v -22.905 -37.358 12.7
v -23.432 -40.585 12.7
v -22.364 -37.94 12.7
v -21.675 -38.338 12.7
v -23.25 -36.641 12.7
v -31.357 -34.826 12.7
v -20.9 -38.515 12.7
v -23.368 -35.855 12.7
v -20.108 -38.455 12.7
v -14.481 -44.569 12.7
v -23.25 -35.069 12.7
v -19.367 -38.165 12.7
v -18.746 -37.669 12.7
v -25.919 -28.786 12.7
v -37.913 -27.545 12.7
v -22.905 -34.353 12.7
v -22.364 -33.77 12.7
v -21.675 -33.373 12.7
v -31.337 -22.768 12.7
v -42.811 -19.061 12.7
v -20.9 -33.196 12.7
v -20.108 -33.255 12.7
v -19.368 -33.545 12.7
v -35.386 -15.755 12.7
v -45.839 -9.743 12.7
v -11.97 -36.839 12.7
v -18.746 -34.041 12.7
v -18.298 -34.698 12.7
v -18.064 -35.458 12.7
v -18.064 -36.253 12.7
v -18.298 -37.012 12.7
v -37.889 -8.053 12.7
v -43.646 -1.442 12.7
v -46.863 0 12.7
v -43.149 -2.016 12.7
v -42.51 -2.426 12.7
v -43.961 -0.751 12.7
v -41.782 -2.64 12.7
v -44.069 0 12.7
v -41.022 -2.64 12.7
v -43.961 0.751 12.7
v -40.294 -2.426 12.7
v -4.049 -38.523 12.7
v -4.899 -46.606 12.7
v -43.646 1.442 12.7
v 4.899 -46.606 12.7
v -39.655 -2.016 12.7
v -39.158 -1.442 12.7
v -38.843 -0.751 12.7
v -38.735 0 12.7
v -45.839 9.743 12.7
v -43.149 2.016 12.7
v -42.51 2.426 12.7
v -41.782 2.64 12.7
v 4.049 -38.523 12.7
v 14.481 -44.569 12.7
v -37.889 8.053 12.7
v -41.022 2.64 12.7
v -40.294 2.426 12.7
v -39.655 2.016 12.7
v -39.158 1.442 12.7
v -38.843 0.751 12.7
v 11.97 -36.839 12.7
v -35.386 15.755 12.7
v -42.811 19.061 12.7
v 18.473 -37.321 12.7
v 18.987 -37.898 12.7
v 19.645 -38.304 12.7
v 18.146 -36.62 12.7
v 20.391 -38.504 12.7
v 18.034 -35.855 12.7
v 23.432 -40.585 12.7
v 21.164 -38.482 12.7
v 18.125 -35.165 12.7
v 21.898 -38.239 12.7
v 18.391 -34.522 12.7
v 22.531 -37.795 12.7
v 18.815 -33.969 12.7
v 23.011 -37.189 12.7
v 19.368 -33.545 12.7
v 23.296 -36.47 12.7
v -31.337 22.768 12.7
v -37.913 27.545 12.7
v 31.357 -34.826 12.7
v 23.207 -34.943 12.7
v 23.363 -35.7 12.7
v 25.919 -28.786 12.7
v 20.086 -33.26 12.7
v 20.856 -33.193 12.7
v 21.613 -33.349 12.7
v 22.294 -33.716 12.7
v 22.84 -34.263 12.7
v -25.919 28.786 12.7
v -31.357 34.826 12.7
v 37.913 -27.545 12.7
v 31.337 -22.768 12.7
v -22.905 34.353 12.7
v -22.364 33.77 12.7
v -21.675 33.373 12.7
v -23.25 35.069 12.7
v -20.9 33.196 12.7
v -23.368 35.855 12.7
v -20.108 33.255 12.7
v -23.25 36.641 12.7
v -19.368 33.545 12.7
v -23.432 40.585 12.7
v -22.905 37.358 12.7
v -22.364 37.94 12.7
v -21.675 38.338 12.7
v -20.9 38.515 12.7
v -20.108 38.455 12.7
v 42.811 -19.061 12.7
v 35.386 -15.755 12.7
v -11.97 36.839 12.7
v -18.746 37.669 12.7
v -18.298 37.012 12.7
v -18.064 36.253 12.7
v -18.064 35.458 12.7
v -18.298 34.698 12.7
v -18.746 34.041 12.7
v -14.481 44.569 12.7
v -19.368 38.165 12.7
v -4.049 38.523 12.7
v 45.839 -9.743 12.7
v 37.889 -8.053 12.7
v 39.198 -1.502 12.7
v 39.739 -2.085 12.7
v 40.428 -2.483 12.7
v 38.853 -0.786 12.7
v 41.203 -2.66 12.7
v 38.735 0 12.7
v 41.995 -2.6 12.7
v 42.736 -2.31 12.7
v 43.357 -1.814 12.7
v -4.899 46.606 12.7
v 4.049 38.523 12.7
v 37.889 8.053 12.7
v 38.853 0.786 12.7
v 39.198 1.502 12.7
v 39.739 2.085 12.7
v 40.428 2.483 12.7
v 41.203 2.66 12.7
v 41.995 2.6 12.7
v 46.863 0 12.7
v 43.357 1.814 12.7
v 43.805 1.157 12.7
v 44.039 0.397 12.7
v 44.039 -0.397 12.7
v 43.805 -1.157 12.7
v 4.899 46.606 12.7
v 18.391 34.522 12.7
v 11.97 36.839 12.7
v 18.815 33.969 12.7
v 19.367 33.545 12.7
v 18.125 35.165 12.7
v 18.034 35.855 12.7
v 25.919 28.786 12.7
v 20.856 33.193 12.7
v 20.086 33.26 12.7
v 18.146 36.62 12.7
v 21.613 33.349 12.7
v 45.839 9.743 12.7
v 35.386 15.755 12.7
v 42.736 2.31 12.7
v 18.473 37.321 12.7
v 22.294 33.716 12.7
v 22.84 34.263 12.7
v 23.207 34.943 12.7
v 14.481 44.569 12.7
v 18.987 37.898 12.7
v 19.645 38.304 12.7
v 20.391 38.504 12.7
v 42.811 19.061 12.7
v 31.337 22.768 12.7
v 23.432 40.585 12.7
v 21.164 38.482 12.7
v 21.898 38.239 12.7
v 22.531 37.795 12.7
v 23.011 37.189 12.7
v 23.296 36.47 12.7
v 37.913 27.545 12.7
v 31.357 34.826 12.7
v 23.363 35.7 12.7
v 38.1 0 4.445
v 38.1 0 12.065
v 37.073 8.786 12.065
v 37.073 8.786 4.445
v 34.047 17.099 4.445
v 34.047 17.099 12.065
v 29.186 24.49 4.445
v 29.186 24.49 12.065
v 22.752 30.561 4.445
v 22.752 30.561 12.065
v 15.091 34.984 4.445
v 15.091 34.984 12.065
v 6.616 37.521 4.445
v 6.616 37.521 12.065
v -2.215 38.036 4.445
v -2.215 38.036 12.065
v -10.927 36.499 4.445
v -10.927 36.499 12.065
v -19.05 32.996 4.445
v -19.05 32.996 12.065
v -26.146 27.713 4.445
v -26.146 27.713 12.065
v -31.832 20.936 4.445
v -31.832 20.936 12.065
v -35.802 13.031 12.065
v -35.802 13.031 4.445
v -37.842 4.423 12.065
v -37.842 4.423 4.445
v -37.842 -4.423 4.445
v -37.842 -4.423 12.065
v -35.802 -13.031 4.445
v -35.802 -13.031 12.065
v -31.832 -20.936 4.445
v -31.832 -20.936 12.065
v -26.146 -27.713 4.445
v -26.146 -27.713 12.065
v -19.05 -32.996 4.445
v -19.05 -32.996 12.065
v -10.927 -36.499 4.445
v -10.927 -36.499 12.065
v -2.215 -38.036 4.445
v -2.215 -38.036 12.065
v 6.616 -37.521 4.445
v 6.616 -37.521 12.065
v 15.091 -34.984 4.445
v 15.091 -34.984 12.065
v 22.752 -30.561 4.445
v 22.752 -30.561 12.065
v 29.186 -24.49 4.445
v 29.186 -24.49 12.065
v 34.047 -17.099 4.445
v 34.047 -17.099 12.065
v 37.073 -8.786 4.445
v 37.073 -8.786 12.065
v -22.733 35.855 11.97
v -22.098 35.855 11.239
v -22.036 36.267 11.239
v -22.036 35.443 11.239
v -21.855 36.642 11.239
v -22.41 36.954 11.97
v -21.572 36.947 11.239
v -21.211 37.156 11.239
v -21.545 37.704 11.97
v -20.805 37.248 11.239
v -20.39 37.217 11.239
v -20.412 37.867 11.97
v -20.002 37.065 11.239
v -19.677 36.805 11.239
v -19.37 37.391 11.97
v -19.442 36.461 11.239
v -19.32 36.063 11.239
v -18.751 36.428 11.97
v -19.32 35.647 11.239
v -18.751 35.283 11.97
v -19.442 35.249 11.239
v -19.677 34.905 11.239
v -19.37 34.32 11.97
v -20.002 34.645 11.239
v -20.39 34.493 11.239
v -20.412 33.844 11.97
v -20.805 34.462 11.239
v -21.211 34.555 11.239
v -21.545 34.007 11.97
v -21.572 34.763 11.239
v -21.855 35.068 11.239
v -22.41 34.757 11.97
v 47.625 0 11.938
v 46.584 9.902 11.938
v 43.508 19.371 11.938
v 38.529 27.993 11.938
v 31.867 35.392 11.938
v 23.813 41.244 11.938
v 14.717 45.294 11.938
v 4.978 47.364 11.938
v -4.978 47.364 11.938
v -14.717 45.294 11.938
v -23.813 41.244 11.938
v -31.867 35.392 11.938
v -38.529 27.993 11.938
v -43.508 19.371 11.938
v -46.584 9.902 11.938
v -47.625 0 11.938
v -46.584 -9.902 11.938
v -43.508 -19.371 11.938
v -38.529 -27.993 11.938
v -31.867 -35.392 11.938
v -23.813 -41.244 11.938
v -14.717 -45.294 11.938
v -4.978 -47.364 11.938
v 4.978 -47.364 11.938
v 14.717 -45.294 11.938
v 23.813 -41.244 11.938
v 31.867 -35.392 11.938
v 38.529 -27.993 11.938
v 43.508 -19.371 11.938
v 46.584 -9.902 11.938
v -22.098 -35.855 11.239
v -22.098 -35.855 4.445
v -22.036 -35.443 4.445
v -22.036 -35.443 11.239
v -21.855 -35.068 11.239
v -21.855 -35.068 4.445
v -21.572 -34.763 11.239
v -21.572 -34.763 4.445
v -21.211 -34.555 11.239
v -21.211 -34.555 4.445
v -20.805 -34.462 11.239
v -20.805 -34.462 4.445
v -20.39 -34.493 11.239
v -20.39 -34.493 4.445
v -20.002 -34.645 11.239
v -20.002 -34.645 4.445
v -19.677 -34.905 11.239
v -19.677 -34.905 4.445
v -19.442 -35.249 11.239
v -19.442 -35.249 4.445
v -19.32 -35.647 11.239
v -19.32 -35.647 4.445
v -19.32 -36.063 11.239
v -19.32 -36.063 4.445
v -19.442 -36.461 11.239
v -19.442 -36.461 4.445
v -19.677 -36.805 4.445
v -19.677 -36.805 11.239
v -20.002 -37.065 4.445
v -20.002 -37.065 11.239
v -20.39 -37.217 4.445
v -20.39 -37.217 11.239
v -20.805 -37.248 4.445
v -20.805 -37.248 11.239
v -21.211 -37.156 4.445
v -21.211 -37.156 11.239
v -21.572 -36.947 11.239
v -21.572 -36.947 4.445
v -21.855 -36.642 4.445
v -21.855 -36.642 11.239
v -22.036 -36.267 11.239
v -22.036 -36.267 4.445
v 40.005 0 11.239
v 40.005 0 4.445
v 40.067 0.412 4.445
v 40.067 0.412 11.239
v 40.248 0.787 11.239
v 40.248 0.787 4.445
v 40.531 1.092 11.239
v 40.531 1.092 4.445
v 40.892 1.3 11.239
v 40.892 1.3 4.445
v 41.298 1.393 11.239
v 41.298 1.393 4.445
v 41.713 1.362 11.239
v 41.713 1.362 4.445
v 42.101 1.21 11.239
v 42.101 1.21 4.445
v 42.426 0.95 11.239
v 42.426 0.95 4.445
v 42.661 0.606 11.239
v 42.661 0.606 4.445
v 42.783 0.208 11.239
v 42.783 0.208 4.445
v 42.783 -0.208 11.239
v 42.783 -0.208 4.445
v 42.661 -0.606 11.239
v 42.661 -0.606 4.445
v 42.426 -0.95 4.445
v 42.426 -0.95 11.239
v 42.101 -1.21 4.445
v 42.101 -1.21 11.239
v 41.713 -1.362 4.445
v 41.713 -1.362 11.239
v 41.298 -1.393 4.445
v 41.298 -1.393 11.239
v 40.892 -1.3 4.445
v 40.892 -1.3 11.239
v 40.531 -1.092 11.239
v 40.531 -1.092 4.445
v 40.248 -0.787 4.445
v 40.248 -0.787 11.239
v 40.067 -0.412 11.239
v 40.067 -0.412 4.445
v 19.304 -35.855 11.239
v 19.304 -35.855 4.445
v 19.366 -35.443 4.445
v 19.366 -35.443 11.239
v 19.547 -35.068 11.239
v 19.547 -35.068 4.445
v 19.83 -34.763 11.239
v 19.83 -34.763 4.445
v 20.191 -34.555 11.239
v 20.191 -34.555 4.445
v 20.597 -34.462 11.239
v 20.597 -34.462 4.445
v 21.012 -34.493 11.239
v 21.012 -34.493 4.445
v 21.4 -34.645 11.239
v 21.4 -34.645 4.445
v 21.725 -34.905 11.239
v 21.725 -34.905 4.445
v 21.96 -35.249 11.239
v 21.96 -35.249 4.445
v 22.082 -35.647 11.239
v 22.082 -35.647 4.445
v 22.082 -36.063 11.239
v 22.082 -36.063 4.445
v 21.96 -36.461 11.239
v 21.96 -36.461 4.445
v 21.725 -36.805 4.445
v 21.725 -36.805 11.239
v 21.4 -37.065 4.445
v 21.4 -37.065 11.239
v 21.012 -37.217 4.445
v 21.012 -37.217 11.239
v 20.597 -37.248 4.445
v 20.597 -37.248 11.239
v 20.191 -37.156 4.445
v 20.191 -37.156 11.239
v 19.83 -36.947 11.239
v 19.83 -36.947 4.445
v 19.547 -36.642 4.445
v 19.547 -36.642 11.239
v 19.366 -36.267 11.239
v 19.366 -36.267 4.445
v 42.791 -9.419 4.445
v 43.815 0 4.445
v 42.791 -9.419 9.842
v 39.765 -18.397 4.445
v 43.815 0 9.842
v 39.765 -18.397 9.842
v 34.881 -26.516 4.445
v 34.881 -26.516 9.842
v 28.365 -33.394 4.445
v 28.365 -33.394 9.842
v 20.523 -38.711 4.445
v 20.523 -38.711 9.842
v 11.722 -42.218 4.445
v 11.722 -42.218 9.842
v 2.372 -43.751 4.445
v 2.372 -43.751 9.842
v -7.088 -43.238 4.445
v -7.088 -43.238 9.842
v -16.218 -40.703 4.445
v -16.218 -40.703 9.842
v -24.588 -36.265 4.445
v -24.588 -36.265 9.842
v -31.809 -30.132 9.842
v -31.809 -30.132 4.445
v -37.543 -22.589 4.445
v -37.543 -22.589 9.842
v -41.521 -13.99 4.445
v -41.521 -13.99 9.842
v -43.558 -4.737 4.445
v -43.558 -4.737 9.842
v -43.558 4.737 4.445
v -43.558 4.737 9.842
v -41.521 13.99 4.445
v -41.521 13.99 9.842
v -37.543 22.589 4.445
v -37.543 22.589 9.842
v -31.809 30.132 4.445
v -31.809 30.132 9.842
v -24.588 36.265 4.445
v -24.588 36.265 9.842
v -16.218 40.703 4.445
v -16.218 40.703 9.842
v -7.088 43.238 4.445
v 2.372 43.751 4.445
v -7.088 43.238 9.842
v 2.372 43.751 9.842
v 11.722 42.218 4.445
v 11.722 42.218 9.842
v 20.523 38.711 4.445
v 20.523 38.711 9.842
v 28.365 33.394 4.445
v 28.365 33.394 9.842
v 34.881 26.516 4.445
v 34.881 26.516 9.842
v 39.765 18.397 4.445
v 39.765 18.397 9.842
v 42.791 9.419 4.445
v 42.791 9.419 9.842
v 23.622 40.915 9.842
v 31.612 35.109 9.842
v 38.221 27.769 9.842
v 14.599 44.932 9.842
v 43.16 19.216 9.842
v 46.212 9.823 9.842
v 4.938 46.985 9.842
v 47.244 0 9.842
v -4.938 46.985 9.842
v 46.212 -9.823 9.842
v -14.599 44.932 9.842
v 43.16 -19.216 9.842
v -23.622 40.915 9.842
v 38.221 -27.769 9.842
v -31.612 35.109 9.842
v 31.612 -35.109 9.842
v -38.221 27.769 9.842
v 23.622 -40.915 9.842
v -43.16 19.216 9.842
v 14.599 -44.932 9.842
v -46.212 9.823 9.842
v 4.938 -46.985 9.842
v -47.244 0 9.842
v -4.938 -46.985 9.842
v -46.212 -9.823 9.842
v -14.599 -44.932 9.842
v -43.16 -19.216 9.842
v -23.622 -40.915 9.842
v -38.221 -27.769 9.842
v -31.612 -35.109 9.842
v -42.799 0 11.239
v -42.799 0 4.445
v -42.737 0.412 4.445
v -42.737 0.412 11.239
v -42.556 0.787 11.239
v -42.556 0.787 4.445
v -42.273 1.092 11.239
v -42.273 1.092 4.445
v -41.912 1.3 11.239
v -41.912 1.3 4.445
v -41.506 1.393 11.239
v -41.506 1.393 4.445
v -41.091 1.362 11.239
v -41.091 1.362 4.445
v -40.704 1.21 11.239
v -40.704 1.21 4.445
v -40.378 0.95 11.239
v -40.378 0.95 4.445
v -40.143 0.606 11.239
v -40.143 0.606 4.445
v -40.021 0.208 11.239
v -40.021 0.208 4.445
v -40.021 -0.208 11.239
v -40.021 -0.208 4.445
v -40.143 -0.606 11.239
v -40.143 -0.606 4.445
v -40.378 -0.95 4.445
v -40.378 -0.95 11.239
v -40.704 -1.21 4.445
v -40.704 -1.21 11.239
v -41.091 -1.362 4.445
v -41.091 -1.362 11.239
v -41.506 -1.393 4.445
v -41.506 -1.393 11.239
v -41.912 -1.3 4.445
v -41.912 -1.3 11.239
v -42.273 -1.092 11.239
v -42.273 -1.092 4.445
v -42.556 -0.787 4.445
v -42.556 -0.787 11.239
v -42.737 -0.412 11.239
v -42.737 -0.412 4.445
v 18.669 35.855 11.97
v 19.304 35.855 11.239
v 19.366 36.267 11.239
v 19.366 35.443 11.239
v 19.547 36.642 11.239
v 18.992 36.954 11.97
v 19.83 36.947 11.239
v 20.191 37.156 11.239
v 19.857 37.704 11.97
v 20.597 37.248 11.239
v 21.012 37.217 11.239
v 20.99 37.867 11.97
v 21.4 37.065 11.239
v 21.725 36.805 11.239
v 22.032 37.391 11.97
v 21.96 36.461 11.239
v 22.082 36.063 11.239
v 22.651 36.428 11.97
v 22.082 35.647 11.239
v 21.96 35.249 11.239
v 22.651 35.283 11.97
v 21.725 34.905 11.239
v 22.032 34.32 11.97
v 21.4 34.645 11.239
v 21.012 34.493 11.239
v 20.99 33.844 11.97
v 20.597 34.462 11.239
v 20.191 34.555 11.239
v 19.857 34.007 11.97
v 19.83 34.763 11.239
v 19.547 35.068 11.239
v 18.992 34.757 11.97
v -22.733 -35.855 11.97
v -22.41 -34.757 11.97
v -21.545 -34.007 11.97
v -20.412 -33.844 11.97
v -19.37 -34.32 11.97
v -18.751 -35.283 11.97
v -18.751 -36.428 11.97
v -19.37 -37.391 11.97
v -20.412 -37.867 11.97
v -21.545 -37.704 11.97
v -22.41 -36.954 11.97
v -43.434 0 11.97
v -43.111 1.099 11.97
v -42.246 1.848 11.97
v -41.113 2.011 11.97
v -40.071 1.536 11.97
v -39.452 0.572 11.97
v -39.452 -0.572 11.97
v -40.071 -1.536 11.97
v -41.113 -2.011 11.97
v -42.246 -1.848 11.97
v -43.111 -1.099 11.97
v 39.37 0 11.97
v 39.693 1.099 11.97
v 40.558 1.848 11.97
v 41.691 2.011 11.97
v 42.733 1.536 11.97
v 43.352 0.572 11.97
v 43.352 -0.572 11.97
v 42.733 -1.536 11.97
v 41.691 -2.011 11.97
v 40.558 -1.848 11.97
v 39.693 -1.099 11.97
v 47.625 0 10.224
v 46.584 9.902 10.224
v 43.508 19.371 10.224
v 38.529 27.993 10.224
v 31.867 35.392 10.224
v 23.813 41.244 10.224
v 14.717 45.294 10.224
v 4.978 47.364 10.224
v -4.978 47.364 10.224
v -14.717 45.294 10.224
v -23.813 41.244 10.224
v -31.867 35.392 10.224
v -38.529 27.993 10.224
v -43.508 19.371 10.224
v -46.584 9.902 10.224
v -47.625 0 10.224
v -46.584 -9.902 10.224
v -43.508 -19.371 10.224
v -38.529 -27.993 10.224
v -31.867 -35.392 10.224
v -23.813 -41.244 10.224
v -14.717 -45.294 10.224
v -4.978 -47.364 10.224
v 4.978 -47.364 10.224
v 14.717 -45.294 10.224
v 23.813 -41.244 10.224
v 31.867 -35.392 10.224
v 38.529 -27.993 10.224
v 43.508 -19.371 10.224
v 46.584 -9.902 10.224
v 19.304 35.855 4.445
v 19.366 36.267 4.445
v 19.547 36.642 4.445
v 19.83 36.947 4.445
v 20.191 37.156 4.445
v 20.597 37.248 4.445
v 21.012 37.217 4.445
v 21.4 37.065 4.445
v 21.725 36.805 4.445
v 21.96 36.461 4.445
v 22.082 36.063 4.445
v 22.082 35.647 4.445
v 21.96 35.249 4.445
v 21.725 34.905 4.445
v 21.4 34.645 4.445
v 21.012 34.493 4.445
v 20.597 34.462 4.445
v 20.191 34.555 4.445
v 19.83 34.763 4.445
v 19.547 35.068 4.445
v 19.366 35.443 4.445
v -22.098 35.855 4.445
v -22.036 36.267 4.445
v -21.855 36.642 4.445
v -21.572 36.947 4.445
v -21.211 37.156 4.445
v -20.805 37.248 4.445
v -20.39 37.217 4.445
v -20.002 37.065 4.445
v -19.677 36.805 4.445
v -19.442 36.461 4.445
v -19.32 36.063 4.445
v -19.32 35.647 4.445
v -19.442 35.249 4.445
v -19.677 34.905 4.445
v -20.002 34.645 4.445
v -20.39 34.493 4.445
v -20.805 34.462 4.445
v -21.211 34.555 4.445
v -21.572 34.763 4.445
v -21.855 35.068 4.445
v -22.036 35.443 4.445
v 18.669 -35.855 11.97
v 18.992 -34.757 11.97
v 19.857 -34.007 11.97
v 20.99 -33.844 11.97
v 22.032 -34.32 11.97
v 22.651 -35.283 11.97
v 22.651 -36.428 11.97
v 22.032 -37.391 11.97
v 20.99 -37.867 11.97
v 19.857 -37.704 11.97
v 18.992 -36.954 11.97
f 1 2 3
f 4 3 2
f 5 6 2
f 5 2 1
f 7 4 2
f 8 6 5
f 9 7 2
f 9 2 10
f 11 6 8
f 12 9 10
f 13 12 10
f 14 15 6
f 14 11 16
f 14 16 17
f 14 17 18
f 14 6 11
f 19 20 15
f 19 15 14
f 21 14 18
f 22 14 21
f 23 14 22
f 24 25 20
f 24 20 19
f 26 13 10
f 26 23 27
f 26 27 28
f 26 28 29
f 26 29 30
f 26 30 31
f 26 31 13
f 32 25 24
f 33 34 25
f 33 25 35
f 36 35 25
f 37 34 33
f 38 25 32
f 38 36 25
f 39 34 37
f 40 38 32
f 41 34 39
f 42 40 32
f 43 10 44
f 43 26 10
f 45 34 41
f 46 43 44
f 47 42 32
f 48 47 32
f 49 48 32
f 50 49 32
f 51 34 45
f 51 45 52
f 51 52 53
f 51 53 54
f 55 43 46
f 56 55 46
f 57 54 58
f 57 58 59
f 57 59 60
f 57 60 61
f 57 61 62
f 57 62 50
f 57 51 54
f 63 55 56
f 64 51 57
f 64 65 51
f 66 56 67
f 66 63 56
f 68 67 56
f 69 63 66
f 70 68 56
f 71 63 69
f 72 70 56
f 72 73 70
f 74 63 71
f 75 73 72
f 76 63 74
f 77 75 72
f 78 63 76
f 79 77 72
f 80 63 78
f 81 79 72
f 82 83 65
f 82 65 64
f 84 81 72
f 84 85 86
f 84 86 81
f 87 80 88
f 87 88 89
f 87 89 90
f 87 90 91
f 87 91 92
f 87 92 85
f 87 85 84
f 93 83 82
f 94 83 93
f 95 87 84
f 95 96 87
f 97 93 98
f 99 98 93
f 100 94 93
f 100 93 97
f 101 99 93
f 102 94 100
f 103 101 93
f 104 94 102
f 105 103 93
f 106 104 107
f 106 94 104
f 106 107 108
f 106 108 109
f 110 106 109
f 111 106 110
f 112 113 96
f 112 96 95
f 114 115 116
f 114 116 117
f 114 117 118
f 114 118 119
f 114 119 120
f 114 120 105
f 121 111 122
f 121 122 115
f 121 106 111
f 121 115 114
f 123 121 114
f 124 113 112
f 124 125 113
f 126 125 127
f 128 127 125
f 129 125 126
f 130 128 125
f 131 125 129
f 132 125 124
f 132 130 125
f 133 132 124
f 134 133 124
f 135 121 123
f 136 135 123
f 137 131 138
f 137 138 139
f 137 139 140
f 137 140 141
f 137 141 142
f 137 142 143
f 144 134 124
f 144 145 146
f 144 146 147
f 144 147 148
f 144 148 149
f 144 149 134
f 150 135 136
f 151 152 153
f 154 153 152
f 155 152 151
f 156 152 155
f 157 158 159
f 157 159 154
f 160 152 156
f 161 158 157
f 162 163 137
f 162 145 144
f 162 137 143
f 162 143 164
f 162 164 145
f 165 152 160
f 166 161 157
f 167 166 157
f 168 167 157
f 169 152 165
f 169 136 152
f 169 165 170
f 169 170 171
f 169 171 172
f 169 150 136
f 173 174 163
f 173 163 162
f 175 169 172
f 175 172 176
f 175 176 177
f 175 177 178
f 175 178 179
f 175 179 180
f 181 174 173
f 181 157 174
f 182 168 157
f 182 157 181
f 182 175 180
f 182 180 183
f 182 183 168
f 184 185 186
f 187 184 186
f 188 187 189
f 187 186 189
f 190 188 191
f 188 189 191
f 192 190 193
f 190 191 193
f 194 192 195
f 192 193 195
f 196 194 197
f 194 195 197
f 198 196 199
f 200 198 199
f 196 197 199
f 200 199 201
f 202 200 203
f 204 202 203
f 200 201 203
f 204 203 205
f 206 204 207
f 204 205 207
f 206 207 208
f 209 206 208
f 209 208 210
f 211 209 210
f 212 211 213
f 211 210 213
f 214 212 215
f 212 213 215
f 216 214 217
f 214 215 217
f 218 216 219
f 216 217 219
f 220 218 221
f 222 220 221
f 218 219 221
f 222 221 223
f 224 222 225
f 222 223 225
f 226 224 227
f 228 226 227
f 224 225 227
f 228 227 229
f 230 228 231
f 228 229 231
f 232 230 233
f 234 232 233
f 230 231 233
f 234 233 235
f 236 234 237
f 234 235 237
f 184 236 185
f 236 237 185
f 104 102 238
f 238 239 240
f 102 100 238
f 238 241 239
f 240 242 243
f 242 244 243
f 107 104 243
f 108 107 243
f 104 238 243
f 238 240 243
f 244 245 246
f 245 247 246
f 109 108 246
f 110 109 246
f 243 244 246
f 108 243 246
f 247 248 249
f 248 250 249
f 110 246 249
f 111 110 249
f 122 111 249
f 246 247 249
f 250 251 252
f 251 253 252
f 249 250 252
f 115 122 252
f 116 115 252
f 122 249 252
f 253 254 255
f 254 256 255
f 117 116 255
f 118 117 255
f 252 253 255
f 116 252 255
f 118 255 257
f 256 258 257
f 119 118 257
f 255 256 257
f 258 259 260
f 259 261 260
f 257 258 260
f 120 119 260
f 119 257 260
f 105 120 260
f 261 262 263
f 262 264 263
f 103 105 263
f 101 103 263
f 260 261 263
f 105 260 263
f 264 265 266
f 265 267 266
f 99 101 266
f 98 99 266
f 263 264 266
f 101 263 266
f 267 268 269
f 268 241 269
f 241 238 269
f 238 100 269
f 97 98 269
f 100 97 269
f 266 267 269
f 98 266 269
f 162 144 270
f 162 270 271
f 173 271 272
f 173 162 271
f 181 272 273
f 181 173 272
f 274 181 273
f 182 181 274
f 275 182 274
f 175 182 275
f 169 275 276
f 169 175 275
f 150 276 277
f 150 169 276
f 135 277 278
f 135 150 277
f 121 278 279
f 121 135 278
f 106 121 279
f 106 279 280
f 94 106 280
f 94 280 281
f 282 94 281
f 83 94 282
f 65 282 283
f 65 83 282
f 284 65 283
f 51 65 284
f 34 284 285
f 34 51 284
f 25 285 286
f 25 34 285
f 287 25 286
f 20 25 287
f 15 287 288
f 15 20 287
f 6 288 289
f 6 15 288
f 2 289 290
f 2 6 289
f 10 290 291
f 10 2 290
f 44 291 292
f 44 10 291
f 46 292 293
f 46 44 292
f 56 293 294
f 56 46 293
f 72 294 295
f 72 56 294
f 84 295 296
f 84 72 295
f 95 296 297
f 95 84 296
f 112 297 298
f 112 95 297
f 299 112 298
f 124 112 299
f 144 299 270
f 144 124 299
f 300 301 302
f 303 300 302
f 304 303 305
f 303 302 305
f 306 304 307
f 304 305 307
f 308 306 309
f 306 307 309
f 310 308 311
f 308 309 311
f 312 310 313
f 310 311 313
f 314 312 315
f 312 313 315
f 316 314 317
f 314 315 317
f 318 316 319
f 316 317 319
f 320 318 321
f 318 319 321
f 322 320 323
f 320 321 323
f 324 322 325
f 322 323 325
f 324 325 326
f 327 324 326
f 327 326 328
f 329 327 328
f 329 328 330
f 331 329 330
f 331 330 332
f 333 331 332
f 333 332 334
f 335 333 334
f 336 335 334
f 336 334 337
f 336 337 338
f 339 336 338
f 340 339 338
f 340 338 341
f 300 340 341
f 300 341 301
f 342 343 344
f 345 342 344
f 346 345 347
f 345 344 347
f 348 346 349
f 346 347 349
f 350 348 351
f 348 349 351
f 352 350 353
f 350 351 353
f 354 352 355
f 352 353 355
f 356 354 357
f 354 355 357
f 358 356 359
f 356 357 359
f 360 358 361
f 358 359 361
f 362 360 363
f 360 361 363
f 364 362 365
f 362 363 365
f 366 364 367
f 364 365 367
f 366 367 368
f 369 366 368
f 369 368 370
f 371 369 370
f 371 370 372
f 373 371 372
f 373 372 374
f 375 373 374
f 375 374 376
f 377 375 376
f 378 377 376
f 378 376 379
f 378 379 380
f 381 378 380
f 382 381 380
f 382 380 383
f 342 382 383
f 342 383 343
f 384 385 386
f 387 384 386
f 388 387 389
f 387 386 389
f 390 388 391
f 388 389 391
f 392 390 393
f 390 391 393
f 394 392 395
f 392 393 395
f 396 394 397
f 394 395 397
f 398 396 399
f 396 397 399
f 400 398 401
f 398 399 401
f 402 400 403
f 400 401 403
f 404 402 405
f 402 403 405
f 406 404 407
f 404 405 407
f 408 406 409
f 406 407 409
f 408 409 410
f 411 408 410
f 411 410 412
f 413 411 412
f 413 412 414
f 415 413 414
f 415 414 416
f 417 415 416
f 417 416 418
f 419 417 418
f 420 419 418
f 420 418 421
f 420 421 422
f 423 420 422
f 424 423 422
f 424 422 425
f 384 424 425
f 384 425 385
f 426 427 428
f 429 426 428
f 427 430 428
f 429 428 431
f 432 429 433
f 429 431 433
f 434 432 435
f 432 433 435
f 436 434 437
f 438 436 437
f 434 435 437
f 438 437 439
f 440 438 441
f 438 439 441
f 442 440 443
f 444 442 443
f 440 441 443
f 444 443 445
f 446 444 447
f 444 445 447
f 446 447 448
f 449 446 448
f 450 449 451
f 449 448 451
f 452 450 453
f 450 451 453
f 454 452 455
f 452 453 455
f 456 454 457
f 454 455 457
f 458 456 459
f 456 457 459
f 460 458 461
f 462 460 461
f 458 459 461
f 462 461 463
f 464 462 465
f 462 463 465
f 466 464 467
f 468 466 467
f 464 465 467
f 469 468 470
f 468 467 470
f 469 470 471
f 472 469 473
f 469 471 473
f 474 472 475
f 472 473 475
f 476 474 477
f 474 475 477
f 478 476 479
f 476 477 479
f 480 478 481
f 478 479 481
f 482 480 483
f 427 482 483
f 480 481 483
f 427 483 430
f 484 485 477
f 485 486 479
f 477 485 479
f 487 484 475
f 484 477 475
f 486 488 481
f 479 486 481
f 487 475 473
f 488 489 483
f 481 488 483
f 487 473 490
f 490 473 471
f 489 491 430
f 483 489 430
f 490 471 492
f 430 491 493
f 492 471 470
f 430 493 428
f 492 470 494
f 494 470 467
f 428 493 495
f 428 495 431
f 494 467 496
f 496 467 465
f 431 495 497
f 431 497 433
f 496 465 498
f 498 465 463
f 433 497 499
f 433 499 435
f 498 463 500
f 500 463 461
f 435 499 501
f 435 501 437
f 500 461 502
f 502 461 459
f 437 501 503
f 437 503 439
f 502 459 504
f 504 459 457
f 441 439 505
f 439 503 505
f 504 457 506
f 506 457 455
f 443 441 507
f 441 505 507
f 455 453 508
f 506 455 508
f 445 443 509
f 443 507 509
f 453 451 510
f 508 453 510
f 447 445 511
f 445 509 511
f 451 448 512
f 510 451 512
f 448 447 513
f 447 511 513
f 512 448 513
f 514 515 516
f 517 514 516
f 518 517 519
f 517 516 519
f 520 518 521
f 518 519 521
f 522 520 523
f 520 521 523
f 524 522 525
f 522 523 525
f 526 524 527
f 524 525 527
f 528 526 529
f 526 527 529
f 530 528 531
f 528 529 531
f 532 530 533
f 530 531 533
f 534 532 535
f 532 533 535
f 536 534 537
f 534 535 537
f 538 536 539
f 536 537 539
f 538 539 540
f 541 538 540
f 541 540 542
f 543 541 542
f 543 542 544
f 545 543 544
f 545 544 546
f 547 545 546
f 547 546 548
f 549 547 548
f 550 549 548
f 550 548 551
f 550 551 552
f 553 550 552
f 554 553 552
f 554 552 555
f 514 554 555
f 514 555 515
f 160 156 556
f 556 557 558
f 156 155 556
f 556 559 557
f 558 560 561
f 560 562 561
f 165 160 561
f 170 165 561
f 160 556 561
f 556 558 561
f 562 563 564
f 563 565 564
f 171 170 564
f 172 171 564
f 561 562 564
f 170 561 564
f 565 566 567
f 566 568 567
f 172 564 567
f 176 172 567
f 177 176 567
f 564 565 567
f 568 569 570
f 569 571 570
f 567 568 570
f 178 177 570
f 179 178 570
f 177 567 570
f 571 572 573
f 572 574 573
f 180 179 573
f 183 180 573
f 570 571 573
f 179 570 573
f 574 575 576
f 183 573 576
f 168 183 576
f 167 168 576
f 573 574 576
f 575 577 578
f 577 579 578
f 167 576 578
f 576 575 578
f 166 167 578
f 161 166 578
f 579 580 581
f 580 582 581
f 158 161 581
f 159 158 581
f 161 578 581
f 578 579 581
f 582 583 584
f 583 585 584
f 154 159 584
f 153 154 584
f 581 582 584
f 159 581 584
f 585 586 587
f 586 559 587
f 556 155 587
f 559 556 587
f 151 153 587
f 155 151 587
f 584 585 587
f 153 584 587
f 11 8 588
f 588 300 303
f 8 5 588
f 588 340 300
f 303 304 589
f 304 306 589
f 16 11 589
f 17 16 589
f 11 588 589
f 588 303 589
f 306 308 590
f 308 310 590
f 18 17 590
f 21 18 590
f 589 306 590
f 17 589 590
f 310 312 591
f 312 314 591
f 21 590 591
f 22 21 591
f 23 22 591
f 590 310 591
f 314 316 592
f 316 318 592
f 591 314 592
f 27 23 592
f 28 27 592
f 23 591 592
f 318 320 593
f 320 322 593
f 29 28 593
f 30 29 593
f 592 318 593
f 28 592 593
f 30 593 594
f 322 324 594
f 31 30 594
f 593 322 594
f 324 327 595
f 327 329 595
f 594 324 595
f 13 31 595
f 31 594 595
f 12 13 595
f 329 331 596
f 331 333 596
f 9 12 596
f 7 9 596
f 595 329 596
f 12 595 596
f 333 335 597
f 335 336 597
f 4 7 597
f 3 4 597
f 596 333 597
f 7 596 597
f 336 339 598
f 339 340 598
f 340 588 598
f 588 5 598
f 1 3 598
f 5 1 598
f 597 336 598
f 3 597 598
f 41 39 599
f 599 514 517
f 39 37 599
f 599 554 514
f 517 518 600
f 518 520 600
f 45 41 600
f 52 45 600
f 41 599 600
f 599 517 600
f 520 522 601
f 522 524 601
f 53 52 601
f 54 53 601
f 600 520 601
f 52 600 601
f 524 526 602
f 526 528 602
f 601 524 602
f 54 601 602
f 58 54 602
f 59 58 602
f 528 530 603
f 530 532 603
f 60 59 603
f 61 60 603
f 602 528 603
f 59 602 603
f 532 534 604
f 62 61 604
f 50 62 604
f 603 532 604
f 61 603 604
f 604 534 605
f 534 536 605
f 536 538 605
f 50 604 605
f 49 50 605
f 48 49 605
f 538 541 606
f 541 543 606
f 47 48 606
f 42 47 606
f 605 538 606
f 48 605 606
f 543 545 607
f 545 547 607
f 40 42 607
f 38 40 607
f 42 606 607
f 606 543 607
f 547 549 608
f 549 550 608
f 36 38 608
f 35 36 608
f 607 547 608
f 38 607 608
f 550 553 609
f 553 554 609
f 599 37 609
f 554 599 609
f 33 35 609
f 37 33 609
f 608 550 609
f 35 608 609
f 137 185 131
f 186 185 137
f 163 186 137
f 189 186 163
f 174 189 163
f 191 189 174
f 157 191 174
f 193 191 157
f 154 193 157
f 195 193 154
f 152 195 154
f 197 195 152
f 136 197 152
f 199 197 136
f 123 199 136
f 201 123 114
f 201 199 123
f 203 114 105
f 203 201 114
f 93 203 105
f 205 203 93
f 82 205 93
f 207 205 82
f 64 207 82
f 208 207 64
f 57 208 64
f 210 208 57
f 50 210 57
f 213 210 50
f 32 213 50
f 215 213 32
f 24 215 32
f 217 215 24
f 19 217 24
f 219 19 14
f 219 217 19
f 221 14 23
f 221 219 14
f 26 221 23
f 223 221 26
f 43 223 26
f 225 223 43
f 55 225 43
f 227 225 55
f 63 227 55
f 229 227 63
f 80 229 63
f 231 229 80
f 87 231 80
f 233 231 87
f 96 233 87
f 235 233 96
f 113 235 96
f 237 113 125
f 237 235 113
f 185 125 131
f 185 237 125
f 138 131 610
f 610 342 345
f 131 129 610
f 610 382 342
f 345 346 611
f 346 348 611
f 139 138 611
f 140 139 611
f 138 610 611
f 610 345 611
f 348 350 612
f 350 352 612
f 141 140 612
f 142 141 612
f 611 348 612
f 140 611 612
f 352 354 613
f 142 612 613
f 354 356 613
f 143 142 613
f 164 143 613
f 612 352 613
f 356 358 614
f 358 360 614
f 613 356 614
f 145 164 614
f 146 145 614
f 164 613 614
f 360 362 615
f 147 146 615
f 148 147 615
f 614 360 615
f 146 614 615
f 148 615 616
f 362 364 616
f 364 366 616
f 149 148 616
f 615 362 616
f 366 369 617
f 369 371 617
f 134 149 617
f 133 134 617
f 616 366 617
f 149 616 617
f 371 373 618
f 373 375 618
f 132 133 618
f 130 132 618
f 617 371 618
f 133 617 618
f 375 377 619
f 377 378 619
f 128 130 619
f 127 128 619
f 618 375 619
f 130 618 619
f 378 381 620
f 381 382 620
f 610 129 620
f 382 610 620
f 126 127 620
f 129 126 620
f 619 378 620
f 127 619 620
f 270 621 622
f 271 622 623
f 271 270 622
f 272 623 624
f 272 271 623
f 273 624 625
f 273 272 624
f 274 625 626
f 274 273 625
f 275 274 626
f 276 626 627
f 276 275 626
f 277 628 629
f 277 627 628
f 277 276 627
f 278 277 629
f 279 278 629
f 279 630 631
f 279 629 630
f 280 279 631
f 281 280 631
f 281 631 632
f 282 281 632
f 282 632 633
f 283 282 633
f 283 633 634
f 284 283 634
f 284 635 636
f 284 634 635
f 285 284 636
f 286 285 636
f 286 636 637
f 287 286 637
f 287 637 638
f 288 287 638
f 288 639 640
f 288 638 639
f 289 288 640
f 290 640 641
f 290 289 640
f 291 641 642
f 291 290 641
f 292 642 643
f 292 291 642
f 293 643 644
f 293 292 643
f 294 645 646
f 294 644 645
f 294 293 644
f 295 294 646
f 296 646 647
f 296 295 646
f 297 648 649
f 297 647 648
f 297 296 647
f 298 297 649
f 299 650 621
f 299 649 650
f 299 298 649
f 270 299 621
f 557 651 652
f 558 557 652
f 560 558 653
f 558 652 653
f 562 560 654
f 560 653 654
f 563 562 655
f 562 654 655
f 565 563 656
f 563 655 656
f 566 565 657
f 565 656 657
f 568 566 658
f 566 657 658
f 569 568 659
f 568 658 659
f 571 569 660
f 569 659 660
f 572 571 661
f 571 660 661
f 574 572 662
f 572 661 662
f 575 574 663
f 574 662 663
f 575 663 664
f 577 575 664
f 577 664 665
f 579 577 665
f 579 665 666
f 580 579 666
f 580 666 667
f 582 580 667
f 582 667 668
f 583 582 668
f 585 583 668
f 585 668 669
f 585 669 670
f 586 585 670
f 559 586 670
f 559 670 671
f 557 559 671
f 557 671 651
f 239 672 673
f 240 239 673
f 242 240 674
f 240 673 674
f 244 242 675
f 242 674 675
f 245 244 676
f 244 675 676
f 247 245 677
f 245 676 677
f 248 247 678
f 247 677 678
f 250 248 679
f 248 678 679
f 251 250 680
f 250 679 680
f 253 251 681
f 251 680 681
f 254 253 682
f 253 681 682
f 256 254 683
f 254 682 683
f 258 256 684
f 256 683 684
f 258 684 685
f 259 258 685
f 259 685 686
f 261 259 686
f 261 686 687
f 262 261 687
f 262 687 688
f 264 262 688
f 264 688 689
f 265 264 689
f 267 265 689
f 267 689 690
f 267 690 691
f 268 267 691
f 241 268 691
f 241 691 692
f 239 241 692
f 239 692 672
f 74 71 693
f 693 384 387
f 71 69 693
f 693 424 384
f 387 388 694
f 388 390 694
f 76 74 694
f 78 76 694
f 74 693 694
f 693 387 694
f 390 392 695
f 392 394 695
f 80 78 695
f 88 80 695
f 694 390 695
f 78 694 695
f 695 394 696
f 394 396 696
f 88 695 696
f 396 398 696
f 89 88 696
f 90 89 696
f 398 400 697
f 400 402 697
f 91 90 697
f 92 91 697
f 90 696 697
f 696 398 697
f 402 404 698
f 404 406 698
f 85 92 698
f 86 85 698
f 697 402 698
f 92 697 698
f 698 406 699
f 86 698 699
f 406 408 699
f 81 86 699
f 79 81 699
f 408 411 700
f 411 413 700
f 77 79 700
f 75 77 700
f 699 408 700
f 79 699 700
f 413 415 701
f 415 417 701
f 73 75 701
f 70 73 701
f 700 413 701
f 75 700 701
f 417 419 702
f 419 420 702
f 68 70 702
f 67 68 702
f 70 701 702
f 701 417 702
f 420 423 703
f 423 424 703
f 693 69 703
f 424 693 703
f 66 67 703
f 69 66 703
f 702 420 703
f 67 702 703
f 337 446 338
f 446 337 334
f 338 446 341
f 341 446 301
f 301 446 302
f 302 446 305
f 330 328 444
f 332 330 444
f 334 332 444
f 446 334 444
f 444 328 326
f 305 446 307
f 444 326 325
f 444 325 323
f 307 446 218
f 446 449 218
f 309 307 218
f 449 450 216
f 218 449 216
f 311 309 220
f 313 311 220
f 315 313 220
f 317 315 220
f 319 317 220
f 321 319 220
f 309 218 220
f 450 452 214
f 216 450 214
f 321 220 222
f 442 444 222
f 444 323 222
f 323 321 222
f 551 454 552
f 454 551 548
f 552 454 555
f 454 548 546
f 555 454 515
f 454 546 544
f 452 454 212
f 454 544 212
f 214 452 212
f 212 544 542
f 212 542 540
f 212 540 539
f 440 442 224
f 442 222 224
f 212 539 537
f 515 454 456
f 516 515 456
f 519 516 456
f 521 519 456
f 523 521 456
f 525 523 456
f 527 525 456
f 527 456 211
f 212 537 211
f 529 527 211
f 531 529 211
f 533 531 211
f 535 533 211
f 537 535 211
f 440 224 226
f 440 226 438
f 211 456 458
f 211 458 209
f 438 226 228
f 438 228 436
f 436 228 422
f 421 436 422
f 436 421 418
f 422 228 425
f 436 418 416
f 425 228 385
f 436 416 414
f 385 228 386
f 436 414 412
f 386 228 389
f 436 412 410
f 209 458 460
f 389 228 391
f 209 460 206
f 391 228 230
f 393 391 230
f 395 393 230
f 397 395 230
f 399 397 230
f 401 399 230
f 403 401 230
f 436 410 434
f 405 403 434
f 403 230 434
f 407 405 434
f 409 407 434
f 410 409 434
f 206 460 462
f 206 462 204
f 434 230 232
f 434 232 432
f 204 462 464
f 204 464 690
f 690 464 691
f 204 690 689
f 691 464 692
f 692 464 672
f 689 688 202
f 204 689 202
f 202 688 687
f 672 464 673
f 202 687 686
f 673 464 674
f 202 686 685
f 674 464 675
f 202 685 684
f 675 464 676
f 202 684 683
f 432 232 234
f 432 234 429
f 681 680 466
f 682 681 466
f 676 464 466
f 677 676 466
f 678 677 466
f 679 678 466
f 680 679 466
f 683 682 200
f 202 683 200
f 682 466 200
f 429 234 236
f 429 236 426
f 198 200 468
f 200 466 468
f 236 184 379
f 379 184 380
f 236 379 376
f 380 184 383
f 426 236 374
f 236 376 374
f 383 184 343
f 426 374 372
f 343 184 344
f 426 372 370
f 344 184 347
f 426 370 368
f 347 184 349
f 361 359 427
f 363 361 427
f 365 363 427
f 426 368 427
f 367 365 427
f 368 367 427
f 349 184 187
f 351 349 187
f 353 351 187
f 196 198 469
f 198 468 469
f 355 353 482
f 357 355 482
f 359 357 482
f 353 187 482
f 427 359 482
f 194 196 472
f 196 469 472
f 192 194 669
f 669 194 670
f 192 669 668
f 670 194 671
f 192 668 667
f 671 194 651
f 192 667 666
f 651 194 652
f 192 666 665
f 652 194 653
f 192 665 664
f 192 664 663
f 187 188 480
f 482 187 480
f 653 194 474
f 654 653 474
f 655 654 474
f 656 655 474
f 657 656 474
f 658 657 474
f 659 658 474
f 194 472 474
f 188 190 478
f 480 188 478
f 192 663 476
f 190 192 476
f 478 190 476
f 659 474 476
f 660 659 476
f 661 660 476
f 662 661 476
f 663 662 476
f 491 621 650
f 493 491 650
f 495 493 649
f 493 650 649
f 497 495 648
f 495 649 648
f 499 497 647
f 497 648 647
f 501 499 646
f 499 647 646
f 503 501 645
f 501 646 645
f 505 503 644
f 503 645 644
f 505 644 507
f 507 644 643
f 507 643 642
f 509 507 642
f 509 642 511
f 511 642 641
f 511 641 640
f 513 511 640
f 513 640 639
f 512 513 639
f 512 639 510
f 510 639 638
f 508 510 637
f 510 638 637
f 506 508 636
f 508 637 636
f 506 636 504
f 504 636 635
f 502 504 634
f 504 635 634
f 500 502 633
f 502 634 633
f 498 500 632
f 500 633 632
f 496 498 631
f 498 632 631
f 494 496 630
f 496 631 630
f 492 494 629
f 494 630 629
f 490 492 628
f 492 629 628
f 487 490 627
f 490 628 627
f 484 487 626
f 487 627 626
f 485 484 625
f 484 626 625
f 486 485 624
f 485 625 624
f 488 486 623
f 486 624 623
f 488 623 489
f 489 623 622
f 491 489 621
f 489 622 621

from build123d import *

# Parameters (mm, degrees)
SKETCH1_R         = 47.625
EXTRUDE1_DEPTH    = 8.255
SKETCH2_R         = 38.1
EXTRUDE2_DEPTH    = 8.255
SKETCH3_W         = 3.81
SKETCH3_H         = 5.3975
CHAMFER1_SIZE     = 0.635
HOLE1_D           = 2.794
HOLE1_DEPTH       = 8.255
HOLE1_CSINK_D     = 5.334
HOLE1_CSINK_ANGLE = 82
HOLE2_D           = 2.794
HOLE2_DEPTH       = 8.255
HOLE2_CSINK_D     = 5.334
HOLE2_CSINK_ANGLE = 82
HOLE3_D           = 2.794
HOLE3_DEPTH       = 8.255
HOLE3_CSINK_D     = 5.334
HOLE3_CSINK_ANGLE = 82
HOLE4_D           = 2.794
HOLE4_DEPTH       = 8.255
HOLE4_CSINK_D     = 5.334
HOLE4_CSINK_ANGLE = 82
HOLE5_D           = 2.794
HOLE5_DEPTH       = 8.255
HOLE5_CSINK_D     = 5.334
HOLE5_CSINK_ANGLE = 82
HOLE6_D           = 2.794
HOLE6_DEPTH       = 8.255
HOLE6_CSINK_D     = 5.334
HOLE6_CSINK_ANGLE = 82
CHAMFER2_SIZE     = 0.381
CHAMFER3_SIZE     = 0.762


with BuildPart() as part:
    # Sketch1 → Extrude1 (new body)
    with BuildSketch(Plane.XY.offset(12.7)):
        Circle(SKETCH1_R)
    extrude(amount=-EXTRUDE1_DEPTH)

    # Sketch2 → Extrude2 (cut)
    with BuildSketch(Plane.XY.offset(12.7)):
        Circle(SKETCH2_R)
    extrude(amount=-EXTRUDE2_DEPTH, mode=Mode.SUBTRACT)

    # Sketch3 → Cut-Revolve1 (revolve, cut)
    with BuildSketch(Plane.XZ):
        with Locations((45.72, 7.14375)):
            Rectangle(SKETCH3_W, SKETCH3_H)
    revolve(axis=Axis((0, 0, 9.8425), (0, 0, -1)), mode=Mode.SUBTRACT)

    # Chamfer1
    chamfer1_edges = [part.edges().sort_by_distance(p)[0] for p in [
        (-38.1, 0, 12.7),
    ]]
    chamfer(chamfer1_edges, length=CHAMFER1_SIZE)

    # Hole1
    with Locations(Plane.XY.offset(12.7)):
        with Locations((-20.701, -35.855183767)):
            CounterSinkHole(HOLE1_D / 2, HOLE1_CSINK_D / 2, depth=HOLE1_DEPTH, counter_sink_angle=HOLE1_CSINK_ANGLE)

    # Hole2
    with Locations(Plane.XY.offset(12.7)):
        with Locations((-41.402, 0)):
            CounterSinkHole(HOLE2_D / 2, HOLE2_CSINK_D / 2, depth=HOLE2_DEPTH, counter_sink_angle=HOLE2_CSINK_ANGLE)

    # Hole3
    with Locations(Plane.XY.offset(12.7)):
        with Locations((-20.701, 35.855183767)):
            CounterSinkHole(HOLE3_D / 2, HOLE3_CSINK_D / 2, depth=HOLE3_DEPTH, counter_sink_angle=HOLE3_CSINK_ANGLE)

    # Hole4
    with Locations(Plane.XY.offset(12.7)):
        with Locations((20.701, 35.855183767)):
            CounterSinkHole(HOLE4_D / 2, HOLE4_CSINK_D / 2, depth=HOLE4_DEPTH, counter_sink_angle=HOLE4_CSINK_ANGLE)

    # Hole5
    with Locations(Plane.XY.offset(12.7)):
        with Locations((20.701, -35.855183767)):
            CounterSinkHole(HOLE5_D / 2, HOLE5_CSINK_D / 2, depth=HOLE5_DEPTH, counter_sink_angle=HOLE5_CSINK_ANGLE)

    # Hole6
    with Locations(Plane.XY.offset(12.7)):
        with Locations((41.402, 0)):
            CounterSinkHole(HOLE6_D / 2, HOLE6_CSINK_D / 2, depth=HOLE6_DEPTH, counter_sink_angle=HOLE6_CSINK_ANGLE)

    # Chamfer2
    chamfer2_edges = [part.edges().sort_by_distance(p)[0] for p in [
        (-47.625, 0, 9.8425),
    ]]
    chamfer(chamfer2_edges, length=CHAMFER2_SIZE)

    # Chamfer3
    chamfer3_edges = [part.edges().sort_by_distance(p)[0] for p in [
        (-47.625, 0, 12.7),
    ]]
    chamfer(chamfer3_edges, length=CHAMFER3_SIZE)


solid = part.part
